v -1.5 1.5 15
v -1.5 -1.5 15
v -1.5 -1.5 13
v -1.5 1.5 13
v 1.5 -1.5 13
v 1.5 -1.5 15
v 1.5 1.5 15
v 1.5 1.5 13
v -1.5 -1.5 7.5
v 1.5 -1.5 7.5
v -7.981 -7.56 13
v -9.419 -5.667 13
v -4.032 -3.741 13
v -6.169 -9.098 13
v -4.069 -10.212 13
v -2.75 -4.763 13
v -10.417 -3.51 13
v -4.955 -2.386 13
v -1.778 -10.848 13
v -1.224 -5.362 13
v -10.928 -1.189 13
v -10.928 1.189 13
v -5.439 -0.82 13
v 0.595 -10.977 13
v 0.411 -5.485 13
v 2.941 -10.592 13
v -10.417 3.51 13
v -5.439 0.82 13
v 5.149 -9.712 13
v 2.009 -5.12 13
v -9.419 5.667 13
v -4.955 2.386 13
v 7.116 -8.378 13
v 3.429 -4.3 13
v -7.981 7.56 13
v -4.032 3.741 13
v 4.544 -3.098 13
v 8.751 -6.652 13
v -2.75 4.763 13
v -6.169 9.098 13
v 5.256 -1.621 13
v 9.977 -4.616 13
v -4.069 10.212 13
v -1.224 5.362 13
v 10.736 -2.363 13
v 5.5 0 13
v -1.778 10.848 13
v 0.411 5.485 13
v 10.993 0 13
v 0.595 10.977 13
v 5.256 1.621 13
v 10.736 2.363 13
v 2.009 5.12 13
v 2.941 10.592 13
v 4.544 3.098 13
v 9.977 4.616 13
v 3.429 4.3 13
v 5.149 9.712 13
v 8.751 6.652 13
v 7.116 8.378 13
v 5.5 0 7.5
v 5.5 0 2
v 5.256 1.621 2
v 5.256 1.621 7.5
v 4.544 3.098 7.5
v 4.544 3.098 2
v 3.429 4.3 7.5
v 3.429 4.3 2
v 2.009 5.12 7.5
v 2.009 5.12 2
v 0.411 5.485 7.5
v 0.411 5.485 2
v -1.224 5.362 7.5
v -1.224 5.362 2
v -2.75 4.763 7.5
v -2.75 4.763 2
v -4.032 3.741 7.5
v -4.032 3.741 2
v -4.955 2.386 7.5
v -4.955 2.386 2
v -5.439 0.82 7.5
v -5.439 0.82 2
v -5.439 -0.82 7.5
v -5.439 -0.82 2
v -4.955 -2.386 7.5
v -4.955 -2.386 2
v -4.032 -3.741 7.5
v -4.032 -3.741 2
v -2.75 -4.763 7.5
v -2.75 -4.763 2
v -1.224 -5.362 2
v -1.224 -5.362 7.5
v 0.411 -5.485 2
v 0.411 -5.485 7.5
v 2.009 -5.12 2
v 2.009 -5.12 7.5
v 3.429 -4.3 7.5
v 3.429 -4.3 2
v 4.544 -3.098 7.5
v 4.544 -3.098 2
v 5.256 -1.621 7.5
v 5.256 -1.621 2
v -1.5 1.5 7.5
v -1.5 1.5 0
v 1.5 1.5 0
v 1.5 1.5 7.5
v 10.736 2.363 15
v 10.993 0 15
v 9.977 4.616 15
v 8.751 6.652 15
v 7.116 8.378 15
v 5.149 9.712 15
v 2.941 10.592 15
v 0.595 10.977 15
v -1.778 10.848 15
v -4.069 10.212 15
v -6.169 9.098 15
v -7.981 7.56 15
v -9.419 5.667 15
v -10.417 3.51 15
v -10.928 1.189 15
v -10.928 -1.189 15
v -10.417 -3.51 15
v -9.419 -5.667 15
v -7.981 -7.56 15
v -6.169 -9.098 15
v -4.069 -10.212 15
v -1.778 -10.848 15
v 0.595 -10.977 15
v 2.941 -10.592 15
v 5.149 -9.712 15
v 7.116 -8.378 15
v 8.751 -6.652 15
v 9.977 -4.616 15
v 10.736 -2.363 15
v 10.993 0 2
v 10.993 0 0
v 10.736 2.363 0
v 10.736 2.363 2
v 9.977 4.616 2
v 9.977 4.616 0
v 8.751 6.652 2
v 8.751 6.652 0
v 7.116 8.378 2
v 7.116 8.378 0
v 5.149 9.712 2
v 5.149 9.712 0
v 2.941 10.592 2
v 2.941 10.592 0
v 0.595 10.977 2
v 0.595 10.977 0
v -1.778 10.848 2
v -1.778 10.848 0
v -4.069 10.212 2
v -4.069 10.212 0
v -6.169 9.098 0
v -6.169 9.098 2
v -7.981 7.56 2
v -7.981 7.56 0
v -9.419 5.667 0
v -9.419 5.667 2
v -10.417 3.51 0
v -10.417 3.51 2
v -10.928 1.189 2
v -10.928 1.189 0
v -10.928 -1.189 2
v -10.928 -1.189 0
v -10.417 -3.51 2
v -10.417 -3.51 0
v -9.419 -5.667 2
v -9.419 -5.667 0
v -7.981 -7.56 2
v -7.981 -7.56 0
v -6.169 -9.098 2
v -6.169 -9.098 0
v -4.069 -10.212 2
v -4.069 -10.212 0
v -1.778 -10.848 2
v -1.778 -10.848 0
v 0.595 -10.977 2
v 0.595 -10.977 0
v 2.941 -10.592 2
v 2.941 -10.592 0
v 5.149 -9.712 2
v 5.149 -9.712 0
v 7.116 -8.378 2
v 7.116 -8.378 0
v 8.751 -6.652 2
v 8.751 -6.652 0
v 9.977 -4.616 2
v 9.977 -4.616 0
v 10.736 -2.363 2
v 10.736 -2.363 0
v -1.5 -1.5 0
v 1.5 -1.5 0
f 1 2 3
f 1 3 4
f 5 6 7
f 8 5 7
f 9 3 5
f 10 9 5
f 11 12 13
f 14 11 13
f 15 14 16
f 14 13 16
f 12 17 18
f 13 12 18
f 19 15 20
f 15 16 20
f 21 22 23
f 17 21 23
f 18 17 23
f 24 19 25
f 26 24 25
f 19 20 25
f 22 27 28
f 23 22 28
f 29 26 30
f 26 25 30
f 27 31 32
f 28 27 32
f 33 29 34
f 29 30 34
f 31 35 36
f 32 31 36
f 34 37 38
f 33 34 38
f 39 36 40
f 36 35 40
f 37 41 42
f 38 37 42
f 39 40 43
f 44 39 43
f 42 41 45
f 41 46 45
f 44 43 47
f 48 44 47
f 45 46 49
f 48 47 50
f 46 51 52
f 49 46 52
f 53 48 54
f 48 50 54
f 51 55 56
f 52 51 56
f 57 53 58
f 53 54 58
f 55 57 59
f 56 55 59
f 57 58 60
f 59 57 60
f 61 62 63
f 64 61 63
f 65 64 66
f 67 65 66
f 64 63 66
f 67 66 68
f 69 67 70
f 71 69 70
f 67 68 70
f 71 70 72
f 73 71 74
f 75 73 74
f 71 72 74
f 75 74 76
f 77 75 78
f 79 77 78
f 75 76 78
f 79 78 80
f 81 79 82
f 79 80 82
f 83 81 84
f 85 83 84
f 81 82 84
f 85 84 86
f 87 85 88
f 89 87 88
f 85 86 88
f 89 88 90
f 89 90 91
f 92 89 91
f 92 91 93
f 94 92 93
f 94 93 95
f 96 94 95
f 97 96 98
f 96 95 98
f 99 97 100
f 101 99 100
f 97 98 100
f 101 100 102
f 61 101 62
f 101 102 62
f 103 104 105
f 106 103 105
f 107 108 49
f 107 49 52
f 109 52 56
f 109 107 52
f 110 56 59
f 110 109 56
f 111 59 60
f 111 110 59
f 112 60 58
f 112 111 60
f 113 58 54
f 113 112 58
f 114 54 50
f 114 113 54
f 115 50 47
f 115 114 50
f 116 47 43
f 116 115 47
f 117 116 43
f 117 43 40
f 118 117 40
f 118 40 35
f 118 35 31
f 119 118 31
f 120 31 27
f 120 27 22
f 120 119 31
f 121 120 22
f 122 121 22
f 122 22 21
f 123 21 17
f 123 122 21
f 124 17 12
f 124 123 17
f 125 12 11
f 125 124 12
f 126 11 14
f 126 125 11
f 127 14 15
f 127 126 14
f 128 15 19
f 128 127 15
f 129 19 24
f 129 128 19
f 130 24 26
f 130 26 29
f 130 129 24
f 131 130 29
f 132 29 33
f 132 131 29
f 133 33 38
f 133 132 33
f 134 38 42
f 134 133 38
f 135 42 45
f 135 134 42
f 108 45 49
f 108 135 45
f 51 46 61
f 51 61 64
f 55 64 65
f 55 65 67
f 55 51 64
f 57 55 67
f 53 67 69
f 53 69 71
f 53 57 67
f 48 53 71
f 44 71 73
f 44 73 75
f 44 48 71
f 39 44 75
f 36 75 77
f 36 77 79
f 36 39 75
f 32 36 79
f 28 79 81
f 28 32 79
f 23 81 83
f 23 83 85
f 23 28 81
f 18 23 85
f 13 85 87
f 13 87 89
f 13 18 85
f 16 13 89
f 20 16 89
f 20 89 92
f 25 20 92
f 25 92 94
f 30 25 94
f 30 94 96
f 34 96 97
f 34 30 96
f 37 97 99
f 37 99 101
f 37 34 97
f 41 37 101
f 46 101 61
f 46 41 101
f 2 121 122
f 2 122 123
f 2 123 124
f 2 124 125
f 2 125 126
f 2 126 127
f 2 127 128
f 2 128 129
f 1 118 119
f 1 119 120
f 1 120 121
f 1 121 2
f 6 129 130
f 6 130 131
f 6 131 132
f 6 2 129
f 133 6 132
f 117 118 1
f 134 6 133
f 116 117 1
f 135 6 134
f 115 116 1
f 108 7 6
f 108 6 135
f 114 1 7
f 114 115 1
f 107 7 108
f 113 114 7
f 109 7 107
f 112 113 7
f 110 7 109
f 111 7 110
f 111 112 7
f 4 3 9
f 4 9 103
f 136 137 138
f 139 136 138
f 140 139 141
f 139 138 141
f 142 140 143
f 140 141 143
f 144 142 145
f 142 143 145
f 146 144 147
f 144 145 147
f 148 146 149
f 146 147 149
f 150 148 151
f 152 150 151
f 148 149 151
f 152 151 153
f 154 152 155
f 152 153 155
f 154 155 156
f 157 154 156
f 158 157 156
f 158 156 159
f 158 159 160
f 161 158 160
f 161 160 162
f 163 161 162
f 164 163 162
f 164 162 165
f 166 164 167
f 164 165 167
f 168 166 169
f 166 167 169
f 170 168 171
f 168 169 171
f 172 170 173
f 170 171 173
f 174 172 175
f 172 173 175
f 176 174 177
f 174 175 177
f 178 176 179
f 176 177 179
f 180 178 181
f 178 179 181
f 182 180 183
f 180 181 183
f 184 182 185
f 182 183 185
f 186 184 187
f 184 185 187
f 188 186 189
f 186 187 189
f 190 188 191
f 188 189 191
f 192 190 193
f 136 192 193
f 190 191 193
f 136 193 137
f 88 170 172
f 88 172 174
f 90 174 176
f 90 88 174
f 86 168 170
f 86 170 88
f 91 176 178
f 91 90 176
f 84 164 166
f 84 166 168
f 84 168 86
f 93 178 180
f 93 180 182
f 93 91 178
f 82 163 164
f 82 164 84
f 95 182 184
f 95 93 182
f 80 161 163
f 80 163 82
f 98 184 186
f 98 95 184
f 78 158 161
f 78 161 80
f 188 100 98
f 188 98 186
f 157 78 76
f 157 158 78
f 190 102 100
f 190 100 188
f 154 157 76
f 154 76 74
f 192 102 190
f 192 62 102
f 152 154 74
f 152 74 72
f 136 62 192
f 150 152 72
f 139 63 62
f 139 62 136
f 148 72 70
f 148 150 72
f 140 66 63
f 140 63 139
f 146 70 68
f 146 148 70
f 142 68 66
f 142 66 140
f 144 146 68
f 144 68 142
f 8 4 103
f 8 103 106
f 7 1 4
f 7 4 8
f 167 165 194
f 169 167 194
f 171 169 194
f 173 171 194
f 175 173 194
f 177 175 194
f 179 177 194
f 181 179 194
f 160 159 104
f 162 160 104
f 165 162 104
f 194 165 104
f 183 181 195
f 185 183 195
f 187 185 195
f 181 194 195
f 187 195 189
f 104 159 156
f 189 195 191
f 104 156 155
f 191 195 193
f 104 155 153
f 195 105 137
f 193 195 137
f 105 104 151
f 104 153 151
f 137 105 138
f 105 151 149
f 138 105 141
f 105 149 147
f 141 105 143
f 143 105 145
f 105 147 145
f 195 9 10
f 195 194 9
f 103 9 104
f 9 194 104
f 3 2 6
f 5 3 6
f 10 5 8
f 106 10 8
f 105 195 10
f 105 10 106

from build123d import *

# Parameters (mm, degrees)
SKETCH_1_R      = 10.992648621
SKETCH_1_W      = 3
SKETCH_1_H      = 3
EXTRUDE_1_DEPTH = 2
SKETCH_2_R      = 5.5
SKETCH_2_W      = 3
SKETCH_2_H      = 3
EXTRUDE_2_DEPTH = 5.5


with BuildPart() as part:
    # 草图1 → 凸台-拉伸1 (new body)
    with BuildSketch(Plane.XY):
        Circle(SKETCH_1_R)
        Rectangle(SKETCH_1_W, SKETCH_1_H, mode=Mode.SUBTRACT)
    extrude_1 = extrude(amount=EXTRUDE_1_DEPTH)

    # 草图2 → 凸台-拉伸2 (add)
    with BuildSketch(Plane.XY.offset(2)):
        Circle(SKETCH_2_R)
        Rectangle(SKETCH_2_W, SKETCH_2_H, mode=Mode.SUBTRACT)
    extrude_2 = extrude(amount=EXTRUDE_2_DEPTH)

    # 镜向1: 凸台-拉伸1, 凸台-拉伸2 across plane
    add(extrude_1.mirror(Plane.XY.offset(7.5)))
    add(extrude_2.mirror(Plane.XY.offset(7.5)))


solid = part.part
